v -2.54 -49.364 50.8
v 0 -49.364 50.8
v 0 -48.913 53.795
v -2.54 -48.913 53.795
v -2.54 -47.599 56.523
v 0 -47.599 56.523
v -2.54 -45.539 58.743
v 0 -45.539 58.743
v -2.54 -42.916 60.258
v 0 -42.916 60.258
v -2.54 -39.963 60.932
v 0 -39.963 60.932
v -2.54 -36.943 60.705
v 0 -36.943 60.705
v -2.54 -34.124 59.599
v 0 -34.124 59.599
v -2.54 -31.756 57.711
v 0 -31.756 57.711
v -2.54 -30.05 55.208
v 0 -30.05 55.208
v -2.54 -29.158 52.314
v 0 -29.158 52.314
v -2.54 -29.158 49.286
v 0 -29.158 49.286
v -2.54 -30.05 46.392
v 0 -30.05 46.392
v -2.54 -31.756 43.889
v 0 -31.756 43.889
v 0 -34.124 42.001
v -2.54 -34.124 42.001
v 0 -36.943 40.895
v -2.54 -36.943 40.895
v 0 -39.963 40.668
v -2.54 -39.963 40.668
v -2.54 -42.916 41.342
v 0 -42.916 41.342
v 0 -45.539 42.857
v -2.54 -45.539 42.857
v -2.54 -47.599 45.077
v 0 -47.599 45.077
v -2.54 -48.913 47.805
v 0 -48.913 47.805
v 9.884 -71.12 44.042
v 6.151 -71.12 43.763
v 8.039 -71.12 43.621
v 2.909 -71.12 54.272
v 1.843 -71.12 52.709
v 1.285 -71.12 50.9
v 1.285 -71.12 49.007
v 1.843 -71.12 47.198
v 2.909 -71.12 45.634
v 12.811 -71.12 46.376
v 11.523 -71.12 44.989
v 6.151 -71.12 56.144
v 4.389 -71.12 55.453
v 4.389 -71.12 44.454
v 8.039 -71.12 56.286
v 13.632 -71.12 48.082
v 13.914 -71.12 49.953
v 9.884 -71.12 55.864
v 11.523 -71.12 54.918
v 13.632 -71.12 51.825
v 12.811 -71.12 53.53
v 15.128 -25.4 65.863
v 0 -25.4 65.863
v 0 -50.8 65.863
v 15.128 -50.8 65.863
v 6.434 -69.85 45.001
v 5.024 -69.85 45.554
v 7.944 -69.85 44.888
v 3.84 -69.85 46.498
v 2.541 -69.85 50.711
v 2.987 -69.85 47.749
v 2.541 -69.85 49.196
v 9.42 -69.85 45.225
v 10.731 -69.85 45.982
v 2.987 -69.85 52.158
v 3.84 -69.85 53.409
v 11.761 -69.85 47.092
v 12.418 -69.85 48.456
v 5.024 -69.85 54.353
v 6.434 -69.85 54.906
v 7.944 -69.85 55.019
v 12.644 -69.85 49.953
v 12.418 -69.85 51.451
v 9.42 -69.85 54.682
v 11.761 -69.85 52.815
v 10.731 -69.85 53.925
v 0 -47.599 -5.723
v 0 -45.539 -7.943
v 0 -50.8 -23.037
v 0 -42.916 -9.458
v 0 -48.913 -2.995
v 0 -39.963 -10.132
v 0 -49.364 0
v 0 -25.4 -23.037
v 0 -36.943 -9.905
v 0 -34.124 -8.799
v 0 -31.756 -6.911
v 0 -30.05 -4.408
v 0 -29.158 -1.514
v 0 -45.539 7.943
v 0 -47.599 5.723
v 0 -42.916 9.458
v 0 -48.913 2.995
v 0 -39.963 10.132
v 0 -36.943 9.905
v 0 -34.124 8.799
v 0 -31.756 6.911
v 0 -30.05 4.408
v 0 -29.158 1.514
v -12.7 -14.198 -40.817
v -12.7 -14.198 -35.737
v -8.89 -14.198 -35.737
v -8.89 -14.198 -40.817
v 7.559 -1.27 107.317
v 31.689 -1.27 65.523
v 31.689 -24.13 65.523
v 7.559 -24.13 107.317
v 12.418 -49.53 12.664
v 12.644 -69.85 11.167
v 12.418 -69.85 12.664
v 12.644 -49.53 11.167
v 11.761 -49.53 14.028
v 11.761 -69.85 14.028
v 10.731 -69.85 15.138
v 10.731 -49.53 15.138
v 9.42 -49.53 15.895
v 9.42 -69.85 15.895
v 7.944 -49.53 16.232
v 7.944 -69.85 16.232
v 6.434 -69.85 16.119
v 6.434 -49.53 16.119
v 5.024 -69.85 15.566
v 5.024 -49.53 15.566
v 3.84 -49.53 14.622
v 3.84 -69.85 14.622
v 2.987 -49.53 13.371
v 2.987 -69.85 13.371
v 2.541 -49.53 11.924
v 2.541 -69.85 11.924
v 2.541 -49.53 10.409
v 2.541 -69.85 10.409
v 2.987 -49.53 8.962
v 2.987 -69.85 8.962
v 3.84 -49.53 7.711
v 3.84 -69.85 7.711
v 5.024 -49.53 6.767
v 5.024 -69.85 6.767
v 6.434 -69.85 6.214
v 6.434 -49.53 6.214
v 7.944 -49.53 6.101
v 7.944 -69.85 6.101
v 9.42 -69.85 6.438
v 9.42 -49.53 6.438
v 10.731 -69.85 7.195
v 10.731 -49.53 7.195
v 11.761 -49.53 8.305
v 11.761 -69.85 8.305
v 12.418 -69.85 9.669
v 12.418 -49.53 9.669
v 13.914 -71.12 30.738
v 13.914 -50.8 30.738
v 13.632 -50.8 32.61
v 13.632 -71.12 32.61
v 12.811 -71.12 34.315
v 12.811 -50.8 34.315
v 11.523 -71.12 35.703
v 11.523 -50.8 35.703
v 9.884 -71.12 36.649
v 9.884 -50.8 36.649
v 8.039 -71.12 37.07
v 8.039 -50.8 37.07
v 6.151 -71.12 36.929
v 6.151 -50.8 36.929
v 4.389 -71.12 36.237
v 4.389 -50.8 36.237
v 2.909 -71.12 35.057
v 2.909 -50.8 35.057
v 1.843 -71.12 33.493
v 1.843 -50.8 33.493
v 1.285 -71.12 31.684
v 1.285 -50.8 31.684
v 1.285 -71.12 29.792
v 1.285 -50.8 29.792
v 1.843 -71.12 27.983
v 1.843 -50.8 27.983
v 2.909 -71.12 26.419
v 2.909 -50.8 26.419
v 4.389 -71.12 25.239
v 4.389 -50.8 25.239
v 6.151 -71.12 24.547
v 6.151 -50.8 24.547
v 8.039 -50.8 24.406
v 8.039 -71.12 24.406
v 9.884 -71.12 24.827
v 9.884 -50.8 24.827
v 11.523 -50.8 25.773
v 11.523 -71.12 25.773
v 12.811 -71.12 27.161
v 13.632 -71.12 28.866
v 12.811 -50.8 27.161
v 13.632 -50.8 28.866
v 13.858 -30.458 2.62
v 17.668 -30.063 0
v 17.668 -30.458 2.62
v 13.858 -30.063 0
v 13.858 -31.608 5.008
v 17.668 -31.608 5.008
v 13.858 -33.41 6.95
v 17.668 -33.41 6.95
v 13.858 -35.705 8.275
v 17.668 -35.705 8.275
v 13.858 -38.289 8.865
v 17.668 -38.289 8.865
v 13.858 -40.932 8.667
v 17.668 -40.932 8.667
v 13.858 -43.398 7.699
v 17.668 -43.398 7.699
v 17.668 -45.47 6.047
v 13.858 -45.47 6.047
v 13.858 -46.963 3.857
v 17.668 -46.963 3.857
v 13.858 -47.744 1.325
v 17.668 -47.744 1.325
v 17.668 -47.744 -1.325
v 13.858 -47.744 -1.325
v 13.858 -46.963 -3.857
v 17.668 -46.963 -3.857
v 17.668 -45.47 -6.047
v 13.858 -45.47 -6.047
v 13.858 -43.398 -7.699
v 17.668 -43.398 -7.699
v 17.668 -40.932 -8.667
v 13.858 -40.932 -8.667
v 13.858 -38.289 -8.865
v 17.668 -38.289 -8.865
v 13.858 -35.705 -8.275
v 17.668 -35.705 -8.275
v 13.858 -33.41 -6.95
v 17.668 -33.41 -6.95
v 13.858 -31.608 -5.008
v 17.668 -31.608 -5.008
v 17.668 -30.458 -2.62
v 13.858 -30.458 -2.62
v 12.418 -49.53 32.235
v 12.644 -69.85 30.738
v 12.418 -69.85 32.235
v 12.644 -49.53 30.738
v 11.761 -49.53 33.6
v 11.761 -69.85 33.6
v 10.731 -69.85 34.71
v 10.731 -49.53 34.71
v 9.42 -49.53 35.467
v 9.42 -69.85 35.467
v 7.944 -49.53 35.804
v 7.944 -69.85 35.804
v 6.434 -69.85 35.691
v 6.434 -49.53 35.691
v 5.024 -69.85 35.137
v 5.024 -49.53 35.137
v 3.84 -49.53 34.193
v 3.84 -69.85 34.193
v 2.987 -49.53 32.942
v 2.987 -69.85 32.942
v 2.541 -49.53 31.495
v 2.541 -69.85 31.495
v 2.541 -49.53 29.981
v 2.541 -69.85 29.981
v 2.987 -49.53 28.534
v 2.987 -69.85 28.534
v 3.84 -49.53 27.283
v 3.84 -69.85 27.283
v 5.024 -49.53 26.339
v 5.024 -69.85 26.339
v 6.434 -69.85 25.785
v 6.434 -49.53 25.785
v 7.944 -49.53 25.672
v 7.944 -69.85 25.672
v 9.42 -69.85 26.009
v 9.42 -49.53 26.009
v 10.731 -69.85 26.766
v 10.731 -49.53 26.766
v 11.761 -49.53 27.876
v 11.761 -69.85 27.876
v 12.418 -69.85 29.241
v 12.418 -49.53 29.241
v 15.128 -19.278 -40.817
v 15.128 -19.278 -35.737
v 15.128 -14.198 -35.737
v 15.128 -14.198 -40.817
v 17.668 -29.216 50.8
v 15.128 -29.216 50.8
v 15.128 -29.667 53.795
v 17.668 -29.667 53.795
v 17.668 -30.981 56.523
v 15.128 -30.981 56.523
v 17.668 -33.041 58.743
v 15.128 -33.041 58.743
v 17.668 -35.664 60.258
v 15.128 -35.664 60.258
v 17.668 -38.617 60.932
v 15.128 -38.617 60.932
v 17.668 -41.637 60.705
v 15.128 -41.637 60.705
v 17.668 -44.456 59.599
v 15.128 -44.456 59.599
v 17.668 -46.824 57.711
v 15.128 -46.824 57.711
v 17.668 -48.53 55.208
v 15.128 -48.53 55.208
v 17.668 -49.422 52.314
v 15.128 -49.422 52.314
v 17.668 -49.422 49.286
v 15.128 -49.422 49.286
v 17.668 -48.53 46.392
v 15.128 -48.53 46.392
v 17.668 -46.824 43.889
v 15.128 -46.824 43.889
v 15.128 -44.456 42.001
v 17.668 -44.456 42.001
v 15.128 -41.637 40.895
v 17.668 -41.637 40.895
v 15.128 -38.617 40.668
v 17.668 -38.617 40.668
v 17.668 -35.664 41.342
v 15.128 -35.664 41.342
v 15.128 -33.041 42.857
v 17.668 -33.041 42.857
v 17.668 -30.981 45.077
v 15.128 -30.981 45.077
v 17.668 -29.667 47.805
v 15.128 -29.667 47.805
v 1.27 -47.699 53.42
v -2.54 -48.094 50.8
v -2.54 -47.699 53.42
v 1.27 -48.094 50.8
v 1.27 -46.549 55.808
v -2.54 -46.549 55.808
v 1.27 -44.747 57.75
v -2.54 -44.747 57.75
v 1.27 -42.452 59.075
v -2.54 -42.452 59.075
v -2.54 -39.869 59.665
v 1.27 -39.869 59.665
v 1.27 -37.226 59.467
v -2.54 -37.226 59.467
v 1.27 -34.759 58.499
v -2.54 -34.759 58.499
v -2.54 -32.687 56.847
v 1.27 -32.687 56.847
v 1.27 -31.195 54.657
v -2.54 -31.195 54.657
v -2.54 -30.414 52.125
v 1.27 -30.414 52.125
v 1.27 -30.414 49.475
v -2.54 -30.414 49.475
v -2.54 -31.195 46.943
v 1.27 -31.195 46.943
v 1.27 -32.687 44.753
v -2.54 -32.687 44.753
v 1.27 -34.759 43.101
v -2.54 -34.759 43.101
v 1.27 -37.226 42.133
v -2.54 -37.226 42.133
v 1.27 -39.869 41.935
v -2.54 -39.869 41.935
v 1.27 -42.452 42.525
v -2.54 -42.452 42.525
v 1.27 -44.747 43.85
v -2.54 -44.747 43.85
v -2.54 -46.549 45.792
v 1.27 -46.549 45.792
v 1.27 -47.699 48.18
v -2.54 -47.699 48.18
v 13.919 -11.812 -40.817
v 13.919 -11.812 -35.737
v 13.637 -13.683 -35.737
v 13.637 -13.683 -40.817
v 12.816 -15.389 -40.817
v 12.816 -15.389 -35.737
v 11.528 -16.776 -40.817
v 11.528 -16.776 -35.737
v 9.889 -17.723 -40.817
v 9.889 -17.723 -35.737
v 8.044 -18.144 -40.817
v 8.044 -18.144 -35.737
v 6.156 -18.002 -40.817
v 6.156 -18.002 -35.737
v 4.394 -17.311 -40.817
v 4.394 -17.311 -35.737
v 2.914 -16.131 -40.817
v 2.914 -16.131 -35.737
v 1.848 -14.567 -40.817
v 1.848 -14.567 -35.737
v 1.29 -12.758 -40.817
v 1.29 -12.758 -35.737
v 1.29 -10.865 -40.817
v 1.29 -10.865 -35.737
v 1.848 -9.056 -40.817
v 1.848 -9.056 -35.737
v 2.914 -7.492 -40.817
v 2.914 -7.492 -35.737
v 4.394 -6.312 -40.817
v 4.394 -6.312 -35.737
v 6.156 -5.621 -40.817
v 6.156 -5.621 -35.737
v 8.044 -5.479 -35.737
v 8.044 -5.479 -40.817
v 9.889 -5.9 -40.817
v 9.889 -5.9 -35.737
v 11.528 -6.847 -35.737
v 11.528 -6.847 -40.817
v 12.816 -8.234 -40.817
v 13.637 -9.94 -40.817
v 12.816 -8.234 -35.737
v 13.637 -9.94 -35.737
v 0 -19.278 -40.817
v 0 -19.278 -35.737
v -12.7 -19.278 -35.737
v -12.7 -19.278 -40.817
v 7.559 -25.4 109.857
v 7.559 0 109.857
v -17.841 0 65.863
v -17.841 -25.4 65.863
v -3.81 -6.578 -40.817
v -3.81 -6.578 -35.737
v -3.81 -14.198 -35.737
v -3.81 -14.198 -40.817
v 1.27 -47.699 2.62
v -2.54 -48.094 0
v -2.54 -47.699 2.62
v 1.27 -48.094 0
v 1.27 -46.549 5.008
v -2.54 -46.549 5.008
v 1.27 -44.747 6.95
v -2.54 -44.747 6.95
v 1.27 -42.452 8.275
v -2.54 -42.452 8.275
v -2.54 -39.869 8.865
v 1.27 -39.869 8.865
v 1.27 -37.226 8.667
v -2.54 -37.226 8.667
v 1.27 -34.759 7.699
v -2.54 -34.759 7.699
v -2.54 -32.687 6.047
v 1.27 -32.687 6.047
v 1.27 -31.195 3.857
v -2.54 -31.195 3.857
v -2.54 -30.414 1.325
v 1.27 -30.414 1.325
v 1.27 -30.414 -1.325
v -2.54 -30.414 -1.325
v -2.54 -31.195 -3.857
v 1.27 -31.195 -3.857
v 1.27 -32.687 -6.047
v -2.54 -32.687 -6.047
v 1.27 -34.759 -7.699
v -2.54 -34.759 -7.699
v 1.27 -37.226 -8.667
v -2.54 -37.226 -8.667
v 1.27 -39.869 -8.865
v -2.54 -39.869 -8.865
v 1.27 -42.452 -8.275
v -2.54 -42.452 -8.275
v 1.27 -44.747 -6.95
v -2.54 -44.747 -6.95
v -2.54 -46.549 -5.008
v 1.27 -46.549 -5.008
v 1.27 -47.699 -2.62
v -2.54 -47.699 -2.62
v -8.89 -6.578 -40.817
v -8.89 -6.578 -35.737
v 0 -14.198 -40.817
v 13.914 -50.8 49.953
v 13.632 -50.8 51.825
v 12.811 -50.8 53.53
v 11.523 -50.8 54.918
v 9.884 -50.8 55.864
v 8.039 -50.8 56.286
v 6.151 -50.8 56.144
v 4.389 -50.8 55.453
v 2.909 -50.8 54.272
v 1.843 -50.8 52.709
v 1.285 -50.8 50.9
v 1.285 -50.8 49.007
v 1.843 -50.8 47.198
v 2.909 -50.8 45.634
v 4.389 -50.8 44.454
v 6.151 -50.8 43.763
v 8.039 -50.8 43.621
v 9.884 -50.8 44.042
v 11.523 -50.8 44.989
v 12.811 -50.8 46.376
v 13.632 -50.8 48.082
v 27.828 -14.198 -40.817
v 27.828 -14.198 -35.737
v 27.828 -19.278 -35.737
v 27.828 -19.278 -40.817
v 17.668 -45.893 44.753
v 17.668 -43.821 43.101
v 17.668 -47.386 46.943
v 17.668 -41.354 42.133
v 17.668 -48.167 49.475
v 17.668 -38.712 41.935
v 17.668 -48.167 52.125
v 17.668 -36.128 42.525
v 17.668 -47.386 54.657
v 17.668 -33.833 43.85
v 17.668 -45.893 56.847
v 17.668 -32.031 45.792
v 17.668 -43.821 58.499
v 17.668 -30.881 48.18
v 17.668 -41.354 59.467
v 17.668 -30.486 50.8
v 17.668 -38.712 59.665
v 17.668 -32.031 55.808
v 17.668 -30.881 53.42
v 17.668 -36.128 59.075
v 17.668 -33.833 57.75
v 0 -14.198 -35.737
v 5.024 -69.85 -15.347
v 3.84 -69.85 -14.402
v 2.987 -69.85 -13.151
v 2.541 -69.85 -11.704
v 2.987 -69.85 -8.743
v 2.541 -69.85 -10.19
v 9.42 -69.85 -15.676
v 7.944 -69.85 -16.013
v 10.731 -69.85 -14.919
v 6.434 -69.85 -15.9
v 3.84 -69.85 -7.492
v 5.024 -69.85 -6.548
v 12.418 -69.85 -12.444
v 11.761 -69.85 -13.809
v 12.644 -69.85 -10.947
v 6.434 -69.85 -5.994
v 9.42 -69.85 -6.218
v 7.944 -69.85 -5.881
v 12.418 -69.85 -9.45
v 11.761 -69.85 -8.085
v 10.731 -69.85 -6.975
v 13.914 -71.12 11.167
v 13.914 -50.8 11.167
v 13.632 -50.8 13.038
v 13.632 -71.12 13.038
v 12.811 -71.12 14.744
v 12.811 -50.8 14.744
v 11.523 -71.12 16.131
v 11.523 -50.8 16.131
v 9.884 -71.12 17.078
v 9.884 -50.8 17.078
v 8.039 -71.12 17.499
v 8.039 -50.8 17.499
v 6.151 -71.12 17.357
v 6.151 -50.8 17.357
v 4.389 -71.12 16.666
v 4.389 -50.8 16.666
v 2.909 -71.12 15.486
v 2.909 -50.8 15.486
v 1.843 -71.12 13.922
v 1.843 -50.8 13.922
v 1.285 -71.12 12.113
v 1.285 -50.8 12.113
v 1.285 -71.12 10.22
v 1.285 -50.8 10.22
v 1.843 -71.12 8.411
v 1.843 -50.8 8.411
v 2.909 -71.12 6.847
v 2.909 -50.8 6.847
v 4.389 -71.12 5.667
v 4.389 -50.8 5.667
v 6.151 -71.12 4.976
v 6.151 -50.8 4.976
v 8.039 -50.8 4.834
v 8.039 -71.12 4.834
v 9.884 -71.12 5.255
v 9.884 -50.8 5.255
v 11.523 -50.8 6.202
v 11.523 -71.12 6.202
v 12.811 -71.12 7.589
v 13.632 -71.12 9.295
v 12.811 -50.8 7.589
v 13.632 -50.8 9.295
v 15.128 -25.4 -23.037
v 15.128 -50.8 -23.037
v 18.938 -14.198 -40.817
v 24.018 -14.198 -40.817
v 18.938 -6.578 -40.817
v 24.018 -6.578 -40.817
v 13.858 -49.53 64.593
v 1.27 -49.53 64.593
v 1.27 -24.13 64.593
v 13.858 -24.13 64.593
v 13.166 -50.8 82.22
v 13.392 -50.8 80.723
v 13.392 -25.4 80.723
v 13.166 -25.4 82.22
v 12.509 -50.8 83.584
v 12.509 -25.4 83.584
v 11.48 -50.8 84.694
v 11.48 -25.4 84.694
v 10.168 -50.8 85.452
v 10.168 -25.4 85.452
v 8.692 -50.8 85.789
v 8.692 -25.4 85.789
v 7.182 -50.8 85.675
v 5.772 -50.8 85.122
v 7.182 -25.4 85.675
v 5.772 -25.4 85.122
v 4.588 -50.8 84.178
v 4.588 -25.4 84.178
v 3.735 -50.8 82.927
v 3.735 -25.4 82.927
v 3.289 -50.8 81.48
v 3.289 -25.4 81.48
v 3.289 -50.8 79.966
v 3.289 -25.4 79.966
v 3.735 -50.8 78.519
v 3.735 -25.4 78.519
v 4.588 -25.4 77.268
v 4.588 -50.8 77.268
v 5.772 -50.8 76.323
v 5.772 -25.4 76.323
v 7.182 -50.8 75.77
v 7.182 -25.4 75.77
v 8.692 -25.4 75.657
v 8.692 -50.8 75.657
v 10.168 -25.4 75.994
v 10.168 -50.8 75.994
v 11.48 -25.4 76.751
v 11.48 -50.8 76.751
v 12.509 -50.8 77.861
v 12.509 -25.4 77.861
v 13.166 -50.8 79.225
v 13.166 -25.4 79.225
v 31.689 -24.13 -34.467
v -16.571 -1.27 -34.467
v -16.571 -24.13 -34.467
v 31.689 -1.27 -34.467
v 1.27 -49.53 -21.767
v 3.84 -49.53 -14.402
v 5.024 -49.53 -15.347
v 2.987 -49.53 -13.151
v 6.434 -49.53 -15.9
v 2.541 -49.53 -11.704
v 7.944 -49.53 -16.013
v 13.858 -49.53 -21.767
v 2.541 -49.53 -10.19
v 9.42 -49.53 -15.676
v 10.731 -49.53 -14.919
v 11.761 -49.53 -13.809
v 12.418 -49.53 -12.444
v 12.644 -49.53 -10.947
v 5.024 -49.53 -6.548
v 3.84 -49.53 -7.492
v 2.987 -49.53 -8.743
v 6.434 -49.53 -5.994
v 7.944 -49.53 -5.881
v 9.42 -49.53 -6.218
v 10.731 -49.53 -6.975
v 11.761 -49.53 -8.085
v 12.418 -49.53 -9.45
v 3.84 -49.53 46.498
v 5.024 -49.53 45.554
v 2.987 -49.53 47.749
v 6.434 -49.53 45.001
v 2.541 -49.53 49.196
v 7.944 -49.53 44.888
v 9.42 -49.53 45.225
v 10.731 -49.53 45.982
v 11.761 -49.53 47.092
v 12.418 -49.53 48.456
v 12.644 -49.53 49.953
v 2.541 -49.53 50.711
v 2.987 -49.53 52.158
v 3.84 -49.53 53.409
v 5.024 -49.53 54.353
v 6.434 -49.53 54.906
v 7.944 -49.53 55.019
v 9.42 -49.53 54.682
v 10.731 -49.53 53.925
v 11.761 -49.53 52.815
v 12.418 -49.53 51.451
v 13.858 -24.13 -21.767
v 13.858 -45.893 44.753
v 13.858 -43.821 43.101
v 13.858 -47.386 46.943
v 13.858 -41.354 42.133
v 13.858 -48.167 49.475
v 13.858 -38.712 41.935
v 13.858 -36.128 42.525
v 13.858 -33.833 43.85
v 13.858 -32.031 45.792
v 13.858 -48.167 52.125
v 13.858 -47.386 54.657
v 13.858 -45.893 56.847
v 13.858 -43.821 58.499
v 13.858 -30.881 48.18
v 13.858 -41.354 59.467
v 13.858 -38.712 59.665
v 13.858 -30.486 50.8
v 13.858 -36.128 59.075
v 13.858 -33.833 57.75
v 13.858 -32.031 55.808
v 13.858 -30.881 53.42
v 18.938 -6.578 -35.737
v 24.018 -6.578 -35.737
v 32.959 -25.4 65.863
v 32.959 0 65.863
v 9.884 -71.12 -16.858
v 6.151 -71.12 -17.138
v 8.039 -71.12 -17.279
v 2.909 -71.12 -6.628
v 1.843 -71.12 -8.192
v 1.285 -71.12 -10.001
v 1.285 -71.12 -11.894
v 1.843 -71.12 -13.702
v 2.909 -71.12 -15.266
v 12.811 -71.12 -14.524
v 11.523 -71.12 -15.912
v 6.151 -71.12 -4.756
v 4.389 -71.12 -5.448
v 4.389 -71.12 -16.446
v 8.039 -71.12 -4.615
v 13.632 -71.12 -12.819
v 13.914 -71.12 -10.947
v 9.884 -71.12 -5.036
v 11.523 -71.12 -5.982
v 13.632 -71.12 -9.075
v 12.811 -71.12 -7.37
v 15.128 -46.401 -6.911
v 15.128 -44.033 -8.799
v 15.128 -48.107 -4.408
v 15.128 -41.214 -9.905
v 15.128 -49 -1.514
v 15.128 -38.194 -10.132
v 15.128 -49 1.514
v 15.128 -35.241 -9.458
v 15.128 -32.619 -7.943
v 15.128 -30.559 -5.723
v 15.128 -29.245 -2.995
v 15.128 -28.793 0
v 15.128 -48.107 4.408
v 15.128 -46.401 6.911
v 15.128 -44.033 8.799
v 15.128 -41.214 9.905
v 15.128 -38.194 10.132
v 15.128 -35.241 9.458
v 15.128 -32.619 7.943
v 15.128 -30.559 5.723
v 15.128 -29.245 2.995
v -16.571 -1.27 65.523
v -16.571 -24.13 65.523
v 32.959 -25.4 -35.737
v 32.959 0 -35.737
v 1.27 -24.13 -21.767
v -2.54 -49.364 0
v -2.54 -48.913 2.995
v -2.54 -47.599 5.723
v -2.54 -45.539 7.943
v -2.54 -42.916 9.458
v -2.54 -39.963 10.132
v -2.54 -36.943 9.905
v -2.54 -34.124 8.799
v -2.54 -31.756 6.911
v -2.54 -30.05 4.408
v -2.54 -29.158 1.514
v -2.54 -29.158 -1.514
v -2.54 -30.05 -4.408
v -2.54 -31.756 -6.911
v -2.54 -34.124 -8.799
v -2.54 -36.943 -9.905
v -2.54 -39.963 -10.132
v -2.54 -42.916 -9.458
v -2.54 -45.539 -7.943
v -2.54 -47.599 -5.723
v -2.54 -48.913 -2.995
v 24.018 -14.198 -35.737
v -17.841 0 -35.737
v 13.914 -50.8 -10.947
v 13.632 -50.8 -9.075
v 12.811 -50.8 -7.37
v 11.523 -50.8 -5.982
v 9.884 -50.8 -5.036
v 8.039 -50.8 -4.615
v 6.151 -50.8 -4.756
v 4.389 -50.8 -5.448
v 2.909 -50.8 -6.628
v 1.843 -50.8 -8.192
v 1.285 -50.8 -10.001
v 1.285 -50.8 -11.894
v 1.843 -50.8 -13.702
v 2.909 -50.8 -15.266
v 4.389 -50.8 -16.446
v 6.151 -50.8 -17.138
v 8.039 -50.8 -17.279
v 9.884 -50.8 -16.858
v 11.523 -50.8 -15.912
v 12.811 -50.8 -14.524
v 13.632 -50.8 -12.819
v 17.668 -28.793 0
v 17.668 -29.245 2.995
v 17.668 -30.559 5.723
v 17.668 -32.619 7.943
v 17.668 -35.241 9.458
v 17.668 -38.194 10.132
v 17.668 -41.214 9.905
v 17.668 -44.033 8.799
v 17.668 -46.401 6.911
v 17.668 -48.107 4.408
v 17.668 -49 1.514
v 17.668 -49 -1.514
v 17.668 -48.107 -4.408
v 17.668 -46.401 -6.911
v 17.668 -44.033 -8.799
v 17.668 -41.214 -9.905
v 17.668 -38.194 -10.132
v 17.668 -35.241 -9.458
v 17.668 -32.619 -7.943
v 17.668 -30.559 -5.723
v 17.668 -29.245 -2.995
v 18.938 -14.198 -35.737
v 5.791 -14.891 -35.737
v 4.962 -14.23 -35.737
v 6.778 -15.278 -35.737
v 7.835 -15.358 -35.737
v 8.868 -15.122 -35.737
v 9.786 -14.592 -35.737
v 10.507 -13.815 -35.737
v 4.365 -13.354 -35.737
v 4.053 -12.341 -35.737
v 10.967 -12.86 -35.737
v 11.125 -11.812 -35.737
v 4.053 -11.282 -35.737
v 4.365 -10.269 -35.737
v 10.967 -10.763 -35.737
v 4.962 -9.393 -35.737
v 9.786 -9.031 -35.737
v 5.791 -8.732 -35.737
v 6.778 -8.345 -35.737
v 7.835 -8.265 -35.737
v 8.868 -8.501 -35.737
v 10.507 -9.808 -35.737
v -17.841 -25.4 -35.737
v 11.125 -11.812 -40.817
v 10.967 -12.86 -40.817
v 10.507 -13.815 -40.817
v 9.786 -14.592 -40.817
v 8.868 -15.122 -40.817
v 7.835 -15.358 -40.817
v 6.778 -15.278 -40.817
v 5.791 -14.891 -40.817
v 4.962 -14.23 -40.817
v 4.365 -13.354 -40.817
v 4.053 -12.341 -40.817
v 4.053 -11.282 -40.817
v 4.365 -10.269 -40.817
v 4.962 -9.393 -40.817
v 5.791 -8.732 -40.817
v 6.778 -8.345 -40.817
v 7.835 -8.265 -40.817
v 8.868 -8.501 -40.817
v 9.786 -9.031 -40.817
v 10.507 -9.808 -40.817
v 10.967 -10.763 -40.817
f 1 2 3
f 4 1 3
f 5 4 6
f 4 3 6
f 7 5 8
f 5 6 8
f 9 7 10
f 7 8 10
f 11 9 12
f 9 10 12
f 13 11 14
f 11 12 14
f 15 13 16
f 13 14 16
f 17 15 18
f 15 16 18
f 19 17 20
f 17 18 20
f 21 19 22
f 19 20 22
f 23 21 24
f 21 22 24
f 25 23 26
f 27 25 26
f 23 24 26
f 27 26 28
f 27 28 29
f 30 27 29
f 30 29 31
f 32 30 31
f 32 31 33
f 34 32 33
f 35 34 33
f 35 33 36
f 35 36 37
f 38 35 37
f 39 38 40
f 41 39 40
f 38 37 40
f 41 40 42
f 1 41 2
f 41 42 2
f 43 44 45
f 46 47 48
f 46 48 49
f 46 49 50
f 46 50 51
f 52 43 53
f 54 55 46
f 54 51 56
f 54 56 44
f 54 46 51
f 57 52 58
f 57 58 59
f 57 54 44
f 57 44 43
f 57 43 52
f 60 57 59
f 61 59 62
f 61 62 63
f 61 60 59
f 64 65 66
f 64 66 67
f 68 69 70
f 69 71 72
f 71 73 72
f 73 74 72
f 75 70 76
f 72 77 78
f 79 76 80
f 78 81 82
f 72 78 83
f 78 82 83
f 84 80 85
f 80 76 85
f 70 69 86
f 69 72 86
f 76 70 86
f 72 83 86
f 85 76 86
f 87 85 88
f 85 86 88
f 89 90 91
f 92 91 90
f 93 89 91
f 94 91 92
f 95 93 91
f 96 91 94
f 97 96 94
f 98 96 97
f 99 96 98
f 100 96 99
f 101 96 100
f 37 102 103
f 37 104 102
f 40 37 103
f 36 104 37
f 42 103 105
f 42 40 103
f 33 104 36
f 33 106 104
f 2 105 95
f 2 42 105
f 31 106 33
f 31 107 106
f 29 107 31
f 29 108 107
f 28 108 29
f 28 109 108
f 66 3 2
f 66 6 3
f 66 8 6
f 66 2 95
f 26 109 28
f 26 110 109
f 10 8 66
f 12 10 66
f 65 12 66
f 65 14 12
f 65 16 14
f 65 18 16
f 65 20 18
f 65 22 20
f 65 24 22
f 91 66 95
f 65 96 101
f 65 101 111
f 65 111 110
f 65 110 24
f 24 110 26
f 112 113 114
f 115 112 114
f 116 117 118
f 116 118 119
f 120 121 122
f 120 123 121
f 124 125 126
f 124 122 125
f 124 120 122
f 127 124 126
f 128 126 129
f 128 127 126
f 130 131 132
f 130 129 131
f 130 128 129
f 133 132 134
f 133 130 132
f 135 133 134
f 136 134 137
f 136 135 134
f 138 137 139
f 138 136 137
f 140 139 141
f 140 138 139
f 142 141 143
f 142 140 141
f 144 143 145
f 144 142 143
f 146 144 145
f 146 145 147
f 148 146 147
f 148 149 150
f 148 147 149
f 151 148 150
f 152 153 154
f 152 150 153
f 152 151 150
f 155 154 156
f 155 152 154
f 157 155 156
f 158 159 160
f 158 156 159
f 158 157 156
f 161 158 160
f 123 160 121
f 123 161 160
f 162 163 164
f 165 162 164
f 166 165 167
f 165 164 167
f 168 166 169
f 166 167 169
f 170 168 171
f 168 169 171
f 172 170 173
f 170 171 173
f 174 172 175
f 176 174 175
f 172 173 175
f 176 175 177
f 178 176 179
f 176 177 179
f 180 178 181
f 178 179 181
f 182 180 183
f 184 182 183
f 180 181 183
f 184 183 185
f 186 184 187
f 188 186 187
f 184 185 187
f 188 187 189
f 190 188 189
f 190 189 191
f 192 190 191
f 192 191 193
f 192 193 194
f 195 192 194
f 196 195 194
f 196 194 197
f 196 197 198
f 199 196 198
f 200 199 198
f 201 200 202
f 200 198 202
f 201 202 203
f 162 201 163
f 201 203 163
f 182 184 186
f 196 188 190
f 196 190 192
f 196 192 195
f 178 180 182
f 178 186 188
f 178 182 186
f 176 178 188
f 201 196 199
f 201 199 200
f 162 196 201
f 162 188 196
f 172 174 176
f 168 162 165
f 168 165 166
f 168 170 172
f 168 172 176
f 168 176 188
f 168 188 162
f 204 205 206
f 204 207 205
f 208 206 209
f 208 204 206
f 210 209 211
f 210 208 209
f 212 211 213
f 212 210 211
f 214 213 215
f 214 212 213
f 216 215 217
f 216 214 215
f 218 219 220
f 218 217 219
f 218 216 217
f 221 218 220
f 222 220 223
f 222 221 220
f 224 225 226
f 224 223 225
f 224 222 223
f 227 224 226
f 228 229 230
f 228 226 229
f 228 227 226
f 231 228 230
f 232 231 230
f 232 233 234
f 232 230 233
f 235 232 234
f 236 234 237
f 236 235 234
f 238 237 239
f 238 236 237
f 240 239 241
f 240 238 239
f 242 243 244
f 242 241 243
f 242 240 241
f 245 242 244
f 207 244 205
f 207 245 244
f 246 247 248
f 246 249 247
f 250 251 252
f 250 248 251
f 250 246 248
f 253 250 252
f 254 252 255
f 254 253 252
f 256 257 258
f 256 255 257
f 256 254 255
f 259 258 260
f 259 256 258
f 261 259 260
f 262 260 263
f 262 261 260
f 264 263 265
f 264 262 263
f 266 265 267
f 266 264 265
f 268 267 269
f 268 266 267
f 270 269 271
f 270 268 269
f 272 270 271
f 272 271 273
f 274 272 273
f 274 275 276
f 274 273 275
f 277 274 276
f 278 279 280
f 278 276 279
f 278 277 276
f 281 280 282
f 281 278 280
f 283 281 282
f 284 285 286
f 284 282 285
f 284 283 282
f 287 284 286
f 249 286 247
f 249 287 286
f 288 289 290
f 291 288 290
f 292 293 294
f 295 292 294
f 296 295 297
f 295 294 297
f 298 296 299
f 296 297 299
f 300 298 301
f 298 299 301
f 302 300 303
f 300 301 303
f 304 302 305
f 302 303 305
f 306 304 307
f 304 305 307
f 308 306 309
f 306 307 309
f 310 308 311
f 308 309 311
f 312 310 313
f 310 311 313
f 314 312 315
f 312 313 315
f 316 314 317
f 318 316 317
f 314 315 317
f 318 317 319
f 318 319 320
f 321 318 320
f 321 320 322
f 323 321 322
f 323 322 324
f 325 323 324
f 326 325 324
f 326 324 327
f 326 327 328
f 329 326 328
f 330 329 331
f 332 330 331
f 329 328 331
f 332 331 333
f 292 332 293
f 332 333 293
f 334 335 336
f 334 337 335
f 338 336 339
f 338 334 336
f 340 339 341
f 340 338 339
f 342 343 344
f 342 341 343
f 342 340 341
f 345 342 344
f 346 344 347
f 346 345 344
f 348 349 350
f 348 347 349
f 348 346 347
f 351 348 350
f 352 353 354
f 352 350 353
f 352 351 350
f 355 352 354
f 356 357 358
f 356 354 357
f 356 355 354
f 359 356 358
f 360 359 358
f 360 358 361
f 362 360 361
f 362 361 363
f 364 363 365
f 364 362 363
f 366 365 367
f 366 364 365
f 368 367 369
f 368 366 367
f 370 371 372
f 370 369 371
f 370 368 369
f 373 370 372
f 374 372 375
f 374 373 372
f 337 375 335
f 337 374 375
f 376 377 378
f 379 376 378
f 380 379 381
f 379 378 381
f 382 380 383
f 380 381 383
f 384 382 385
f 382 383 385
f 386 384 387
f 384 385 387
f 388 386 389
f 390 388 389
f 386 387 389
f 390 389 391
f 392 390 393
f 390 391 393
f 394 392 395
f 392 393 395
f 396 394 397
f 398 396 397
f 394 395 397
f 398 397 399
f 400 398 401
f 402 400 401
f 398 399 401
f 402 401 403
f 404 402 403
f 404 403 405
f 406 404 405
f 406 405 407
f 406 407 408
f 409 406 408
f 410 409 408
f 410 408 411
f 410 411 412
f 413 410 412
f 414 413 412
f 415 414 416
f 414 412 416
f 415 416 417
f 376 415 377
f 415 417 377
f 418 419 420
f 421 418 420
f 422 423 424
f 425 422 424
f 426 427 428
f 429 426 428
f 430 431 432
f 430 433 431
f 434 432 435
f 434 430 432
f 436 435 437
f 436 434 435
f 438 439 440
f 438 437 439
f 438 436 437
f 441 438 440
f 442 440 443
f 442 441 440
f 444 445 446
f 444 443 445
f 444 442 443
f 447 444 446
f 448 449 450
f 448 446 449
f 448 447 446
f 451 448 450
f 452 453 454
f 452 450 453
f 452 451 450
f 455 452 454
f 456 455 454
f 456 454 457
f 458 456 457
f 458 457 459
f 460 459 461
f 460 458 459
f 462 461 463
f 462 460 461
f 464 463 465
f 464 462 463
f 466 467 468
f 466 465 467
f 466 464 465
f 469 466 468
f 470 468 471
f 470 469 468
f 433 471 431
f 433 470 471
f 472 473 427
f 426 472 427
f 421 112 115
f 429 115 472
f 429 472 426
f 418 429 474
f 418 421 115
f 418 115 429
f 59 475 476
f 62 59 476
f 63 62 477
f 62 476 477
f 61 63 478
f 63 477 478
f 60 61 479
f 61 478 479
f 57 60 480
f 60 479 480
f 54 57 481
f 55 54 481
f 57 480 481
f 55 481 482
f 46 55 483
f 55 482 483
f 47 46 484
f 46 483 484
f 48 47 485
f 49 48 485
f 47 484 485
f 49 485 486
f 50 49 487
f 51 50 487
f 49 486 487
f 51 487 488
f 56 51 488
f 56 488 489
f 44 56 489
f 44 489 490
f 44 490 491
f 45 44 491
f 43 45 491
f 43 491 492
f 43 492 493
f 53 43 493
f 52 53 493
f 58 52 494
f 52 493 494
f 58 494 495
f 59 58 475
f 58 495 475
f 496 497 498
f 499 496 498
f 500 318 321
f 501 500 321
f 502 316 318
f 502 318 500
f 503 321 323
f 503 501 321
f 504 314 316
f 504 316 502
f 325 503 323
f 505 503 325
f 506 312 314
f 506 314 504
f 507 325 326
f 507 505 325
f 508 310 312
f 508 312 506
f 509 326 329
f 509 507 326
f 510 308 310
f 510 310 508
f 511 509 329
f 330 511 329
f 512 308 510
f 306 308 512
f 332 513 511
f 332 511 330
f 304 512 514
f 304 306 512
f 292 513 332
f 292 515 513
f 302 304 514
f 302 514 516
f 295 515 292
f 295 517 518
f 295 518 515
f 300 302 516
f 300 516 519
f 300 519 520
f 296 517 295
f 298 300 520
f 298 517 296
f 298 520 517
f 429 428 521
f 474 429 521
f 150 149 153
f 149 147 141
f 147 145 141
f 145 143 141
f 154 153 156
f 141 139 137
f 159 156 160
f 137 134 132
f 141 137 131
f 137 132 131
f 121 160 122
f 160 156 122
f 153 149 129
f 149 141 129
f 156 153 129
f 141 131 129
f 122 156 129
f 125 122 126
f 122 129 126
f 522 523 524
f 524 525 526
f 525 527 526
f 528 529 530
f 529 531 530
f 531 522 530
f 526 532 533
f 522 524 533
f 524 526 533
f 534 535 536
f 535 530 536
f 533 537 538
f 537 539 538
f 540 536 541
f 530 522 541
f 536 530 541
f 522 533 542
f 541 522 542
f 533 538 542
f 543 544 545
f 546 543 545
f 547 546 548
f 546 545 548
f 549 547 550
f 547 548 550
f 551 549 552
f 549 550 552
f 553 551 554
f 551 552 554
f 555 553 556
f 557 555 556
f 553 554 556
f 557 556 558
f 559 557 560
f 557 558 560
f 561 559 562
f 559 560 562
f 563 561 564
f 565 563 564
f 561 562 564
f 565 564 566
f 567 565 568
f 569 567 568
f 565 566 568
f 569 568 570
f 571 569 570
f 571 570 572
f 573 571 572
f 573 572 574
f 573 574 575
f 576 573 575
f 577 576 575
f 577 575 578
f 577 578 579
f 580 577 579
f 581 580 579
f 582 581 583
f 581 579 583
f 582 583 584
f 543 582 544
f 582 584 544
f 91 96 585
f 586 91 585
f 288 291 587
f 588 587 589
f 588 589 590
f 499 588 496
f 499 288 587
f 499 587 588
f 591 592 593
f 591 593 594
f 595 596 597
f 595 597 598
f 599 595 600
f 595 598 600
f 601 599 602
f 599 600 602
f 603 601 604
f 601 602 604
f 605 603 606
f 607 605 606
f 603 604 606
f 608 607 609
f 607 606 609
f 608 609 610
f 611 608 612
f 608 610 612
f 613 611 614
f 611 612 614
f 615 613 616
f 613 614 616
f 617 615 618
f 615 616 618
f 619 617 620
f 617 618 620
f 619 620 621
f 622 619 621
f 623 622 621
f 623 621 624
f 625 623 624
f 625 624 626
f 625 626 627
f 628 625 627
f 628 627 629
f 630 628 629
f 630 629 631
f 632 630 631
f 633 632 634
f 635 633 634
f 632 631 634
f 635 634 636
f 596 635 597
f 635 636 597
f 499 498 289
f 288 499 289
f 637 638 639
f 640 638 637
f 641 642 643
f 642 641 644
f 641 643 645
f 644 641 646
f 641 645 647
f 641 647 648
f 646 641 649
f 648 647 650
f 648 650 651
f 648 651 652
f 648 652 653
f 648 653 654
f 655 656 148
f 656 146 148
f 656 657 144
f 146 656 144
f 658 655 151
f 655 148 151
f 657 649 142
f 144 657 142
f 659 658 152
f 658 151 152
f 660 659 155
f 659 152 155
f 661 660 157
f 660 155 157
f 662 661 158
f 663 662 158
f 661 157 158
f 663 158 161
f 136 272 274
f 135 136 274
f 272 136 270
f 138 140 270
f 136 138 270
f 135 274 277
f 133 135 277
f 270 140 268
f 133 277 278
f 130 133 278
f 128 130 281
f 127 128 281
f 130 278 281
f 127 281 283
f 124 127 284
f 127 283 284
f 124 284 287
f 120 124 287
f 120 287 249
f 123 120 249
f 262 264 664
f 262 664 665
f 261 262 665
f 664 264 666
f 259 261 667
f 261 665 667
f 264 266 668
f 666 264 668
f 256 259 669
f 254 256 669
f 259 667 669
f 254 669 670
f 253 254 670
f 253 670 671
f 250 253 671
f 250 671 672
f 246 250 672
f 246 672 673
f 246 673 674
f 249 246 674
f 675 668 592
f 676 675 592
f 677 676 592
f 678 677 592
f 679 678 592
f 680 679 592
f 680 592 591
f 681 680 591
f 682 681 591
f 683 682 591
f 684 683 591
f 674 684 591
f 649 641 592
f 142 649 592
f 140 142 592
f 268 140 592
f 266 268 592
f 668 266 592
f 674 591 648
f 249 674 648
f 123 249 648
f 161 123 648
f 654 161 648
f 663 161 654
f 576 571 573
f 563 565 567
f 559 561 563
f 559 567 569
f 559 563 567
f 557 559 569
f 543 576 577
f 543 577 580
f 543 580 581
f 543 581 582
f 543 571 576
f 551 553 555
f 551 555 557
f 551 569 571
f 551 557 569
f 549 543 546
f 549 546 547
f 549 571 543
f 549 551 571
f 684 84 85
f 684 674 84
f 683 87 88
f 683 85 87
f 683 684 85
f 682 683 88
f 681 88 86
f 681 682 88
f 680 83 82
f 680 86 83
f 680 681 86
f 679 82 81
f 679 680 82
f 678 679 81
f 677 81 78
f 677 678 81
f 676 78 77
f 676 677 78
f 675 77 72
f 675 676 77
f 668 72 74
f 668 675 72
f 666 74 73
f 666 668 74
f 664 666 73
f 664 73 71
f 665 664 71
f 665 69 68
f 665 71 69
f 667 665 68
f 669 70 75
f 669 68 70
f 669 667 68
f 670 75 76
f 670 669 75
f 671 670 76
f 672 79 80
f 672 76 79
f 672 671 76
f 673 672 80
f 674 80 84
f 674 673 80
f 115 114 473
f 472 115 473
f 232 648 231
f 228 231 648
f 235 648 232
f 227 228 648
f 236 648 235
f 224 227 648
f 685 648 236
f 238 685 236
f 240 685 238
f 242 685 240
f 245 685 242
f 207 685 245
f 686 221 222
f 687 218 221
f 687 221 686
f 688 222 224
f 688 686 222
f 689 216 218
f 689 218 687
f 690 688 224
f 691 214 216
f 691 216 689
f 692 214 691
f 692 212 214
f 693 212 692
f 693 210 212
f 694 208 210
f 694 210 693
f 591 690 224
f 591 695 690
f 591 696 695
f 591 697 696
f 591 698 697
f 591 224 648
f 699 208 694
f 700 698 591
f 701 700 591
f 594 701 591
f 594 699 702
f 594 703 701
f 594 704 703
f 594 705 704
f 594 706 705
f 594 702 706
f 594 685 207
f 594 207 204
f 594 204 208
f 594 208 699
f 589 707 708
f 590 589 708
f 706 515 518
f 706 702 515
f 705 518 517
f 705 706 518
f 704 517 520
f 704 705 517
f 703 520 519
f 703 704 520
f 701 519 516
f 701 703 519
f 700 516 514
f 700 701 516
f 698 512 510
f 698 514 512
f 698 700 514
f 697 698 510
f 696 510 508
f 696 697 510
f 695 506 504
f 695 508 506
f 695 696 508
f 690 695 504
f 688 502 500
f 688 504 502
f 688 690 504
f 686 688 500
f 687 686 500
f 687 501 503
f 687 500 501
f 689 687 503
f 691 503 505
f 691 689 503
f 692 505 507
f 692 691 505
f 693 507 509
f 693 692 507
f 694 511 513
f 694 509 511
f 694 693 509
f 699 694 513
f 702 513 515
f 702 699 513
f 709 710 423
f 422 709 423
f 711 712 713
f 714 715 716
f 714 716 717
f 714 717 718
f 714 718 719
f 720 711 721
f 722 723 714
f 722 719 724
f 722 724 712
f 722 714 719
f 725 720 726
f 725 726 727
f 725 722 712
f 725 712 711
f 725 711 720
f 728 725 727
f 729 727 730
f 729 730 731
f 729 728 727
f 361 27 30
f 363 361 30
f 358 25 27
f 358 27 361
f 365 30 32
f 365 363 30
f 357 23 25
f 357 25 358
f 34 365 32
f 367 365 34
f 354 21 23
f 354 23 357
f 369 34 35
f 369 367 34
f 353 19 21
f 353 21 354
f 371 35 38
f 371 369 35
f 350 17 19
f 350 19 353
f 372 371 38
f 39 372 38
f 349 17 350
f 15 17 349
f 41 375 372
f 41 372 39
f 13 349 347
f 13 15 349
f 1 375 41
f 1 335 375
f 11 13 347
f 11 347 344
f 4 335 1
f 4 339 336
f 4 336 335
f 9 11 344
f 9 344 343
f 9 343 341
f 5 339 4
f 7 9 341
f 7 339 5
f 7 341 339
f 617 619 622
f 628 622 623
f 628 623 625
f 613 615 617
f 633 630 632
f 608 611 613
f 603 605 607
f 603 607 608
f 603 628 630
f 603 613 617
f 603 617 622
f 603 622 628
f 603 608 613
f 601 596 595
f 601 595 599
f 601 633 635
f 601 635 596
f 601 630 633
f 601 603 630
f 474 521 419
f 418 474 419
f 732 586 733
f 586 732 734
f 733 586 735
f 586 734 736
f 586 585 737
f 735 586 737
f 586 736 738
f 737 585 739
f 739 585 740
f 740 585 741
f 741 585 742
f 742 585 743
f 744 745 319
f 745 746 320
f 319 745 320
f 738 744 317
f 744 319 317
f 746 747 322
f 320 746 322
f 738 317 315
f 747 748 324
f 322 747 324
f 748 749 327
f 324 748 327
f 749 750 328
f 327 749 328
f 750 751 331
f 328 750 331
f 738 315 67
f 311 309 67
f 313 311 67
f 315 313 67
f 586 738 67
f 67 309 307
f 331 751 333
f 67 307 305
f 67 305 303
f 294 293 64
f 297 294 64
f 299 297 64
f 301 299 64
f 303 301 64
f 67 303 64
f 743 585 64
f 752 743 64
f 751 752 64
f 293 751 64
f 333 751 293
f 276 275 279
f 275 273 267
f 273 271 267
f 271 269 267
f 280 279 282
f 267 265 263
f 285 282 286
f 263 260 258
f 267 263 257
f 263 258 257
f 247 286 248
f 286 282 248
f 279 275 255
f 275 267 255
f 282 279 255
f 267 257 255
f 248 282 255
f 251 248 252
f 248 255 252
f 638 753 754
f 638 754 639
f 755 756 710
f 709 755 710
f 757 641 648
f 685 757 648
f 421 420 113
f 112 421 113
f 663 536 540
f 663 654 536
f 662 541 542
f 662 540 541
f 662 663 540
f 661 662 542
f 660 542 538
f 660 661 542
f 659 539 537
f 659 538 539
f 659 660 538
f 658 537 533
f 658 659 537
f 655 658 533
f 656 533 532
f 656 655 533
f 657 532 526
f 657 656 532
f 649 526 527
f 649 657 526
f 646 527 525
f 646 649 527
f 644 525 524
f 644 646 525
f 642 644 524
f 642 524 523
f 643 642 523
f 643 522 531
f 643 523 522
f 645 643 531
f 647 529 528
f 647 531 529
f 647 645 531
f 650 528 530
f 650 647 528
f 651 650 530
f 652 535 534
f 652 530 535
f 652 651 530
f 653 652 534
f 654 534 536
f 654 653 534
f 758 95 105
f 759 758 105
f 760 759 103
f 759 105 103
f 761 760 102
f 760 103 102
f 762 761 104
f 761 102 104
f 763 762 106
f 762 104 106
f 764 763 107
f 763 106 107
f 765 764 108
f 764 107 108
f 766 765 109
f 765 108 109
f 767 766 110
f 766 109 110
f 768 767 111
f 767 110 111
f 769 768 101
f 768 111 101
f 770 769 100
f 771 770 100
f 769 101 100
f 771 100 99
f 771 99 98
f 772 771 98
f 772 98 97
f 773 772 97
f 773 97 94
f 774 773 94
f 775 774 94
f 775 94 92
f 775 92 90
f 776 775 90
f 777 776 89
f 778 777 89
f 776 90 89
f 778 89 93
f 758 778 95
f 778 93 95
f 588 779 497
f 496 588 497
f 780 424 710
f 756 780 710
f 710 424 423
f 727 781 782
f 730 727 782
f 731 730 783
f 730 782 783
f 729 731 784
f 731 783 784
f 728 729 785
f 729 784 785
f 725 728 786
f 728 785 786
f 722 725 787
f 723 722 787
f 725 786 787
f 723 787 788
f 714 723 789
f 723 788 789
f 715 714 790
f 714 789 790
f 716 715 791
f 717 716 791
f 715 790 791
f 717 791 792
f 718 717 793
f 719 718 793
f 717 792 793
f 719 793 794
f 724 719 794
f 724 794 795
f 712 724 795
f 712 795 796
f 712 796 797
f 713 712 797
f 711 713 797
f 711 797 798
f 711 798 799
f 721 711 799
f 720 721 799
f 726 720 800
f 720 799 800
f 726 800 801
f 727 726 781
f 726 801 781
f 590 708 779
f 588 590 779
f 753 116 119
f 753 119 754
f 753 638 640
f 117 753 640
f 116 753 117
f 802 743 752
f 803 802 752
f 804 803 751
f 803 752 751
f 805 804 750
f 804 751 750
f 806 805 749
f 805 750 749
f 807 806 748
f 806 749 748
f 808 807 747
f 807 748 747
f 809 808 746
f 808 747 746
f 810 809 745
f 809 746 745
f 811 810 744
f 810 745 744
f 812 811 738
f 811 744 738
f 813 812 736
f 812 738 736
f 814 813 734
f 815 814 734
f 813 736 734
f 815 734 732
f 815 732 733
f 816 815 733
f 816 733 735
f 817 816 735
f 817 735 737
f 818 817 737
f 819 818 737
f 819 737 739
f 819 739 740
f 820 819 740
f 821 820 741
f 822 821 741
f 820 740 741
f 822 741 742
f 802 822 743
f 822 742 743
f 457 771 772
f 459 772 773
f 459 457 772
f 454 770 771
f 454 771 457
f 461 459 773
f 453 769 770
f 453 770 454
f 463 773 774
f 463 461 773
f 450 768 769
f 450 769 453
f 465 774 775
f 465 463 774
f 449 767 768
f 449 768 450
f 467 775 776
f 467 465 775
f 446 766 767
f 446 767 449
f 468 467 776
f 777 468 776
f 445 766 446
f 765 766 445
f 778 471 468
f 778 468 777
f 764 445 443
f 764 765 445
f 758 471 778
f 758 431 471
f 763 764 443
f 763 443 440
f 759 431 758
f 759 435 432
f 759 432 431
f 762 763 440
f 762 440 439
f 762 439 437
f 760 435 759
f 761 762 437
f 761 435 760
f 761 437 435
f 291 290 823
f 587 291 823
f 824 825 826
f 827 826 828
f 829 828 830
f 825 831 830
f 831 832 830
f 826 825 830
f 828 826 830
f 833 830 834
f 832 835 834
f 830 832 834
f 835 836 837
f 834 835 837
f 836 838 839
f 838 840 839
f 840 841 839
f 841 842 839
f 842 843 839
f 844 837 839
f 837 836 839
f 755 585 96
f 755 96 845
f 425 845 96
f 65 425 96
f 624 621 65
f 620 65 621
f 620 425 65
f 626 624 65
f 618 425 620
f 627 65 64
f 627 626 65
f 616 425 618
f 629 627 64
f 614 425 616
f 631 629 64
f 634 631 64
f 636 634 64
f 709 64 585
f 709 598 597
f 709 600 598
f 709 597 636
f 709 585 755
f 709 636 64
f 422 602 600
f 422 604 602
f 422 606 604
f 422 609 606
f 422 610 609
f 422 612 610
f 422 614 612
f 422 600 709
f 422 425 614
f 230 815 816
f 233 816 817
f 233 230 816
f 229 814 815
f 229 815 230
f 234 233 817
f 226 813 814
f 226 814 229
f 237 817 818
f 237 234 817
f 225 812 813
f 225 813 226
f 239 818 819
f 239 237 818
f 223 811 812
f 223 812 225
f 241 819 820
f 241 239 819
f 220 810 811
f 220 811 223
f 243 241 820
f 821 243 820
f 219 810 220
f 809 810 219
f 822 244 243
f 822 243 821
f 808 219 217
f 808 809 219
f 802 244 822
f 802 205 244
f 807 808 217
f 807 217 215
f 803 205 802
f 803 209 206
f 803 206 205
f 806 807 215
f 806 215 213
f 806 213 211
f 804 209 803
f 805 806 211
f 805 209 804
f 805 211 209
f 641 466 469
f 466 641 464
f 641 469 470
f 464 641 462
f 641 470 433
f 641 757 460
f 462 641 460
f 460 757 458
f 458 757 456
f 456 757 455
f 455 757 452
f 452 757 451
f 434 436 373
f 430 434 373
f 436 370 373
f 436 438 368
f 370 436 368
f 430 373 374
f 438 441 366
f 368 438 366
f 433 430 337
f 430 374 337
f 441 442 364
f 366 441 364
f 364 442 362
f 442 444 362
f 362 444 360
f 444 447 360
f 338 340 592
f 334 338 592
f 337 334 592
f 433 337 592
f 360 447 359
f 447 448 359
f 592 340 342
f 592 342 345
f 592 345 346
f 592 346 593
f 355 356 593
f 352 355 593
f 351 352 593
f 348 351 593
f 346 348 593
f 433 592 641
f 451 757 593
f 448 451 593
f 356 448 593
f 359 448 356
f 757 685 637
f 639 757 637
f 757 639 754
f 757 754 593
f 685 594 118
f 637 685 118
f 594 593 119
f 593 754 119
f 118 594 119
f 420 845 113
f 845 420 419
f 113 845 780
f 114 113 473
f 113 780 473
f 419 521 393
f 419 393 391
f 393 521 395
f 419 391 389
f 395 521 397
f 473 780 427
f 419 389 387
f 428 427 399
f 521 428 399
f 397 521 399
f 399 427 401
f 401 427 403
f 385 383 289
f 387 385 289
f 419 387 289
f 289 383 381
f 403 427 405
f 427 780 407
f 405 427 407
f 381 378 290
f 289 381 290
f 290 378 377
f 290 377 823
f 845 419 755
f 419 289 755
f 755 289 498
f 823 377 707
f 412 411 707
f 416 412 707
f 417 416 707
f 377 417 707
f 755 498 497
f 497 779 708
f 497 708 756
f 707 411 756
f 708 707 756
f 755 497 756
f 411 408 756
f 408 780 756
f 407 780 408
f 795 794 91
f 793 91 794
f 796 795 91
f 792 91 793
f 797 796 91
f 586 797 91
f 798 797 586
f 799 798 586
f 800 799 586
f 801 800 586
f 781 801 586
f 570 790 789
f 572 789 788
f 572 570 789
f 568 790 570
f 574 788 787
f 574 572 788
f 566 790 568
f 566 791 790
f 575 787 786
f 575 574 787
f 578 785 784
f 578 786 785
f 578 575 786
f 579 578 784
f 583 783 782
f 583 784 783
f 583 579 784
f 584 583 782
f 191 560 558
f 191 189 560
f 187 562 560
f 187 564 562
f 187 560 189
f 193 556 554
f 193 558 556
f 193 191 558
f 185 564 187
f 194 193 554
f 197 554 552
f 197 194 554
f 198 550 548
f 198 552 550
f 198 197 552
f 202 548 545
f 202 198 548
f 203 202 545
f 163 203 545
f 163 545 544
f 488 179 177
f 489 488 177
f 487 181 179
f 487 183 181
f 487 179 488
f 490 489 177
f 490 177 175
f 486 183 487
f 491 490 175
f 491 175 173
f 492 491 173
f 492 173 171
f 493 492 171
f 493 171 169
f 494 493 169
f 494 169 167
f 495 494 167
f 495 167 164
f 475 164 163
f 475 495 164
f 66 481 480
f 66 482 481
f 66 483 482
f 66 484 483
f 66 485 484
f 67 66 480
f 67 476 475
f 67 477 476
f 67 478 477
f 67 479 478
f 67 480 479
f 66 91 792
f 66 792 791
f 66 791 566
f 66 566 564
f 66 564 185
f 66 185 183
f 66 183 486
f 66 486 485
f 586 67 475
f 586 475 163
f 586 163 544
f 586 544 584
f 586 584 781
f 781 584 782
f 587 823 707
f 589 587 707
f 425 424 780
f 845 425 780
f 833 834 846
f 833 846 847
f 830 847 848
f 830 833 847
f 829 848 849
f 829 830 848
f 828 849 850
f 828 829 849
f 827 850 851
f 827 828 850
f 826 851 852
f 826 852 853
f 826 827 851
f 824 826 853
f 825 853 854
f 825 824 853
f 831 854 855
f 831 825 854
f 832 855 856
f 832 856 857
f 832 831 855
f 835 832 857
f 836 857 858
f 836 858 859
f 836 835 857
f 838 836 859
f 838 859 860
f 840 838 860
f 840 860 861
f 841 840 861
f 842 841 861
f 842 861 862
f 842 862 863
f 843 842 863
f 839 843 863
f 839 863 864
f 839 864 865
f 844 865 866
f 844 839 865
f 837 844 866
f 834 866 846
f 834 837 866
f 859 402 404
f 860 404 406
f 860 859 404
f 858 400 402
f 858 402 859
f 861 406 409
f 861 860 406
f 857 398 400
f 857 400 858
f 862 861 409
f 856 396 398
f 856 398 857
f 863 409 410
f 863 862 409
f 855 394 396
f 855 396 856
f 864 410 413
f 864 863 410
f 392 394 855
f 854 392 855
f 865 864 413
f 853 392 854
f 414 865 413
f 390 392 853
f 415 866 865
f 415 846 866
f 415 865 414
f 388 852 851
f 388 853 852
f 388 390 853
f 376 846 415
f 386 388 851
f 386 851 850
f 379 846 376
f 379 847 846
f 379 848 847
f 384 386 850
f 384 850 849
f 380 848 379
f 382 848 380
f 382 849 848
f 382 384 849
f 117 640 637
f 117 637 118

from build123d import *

# Parameters (mm, degrees)
F1_DEPTH  = 25.4
F2_W      = 15.1281697808
F2_H      = 88.9
F3_DEPTH  = 25.4
F4_R      = 6.35
F5_DEPTH  = 20.32
F7_R      = 10.16
F8_DEPTH  = 2.54
F6_R      = 10.16
F9_DEPTH  = 2.54
F10_T     = -1.27
F11_R     = 6.35
F11_R_2   = 3.556
F12_DEPTH = 5.08
F13_R     = 5.08
F14_DEPTH = 25.4


with BuildPart() as f1:
    # F0 (on Front) → F1 (new body)
    with BuildSketch(Plane.XZ):
        Polygon((-17.8410302192, 65.8628800811), (-17.8410302192, -35.7371199189), (32.9589697808, -35.7371199189), (32.9589697808, 65.8628800811), (7.5589697808, 109.8569705933), align=None)
    extrude(amount=F1_DEPTH)

    # F2 (on face) → F3 (join)
    with BuildSketch(Plane.XZ.offset(25.4)):
        with Locations((7.5640848904, 21.4128800811)):
            Rectangle(F2_W, F2_H)
    extrude(amount=F3_DEPTH)

    # F4 (on face) → F5 (join)
    with BuildSketch(Plane.XZ.offset(50.8)):
        with Locations((7.5640848904, 49.9533750117)):
            Circle(F4_R)
        with Locations((7.5640848904, 30.7380091399)):
            Circle(F4_R)
        with Locations((7.5640848904, 11.1665166914)):
            Circle(F4_R)
        with Locations((7.5640848904, -10.9471287578)):
            Circle(F4_R)
    extrude(amount=F5_DEPTH)

    # F7 (on face) → F8 (join)
    with BuildSketch(Plane.YZ.offset(15.1281697808)):
        with Locations((-38.9532968402, 0)):
            Circle(F7_R)
        with Locations((-39.375923574, 50.8)):
            Circle(F7_R)
    extrude(amount=F8_DEPTH)

    # F6 (on face) → F9 (join)
    with BuildSketch(Plane(origin=(0, 0, 0), x_dir=(0, -1, 0), z_dir=(-1, 0, 0))):
        with Locations((39.2042249441, 50.8)):
            Circle(F6_R)
        with Locations((39.2042249441, 0)):
            Circle(F6_R)
    extrude(amount=F9_DEPTH)

    # F10
    f10_openings = [f1.faces().sort_by_distance(p)[0] for p in [
        (17.66817, -38.953297, 0),
        (17.66817, -39.375924, 50.8),
        (-2.54, -39.204225, 50.8),
        (-2.54, -39.204225, 0),
    ]]
    offset(amount=F10_T, openings=f10_openings, kind=Kind.INTERSECTION)

    # F11 (on face) → F12 (join)
    with BuildSketch(Plane(origin=(0, 0, -35.7371199189), x_dir=(1, 0, 0), z_dir=(0, 0, -1))):
        with Locations((7.5692, 11.8115022779)):
            Circle(F11_R)
        with Locations((7.5692, 11.8115022779)):
            Circle(F11_R_2, mode=Mode.SUBTRACT)
        Polygon((0, 19.2781486231), (-12.7, 19.2781486231), (-12.7, 14.1981486231), (-8.89, 14.1981486231), (-8.89, 6.5781486231), (-3.81, 6.5781486231), (-3.81, 14.1981486231), (0, 14.1981486231), align=None)
        Polygon((27.8281697808, 19.2781486231), (15.1281697808, 19.2781486231), (15.1281697808, 14.1981486231), (18.9381697808, 14.1981486231), (18.9381697808, 6.5781486231), (24.0181697808, 6.5781486231), (24.0181697808, 14.1981486231), (27.8281697808, 14.1981486231), align=None)
    extrude(amount=F12_DEPTH)

    # F13 (on face) → F14 (join)
    with BuildSketch(Plane.XZ.offset(25.4)):
        with Locations((8.3121880889, 80.7227864861)):
            Circle(F13_R)
    extrude(amount=F14_DEPTH)


solid = f1.part
